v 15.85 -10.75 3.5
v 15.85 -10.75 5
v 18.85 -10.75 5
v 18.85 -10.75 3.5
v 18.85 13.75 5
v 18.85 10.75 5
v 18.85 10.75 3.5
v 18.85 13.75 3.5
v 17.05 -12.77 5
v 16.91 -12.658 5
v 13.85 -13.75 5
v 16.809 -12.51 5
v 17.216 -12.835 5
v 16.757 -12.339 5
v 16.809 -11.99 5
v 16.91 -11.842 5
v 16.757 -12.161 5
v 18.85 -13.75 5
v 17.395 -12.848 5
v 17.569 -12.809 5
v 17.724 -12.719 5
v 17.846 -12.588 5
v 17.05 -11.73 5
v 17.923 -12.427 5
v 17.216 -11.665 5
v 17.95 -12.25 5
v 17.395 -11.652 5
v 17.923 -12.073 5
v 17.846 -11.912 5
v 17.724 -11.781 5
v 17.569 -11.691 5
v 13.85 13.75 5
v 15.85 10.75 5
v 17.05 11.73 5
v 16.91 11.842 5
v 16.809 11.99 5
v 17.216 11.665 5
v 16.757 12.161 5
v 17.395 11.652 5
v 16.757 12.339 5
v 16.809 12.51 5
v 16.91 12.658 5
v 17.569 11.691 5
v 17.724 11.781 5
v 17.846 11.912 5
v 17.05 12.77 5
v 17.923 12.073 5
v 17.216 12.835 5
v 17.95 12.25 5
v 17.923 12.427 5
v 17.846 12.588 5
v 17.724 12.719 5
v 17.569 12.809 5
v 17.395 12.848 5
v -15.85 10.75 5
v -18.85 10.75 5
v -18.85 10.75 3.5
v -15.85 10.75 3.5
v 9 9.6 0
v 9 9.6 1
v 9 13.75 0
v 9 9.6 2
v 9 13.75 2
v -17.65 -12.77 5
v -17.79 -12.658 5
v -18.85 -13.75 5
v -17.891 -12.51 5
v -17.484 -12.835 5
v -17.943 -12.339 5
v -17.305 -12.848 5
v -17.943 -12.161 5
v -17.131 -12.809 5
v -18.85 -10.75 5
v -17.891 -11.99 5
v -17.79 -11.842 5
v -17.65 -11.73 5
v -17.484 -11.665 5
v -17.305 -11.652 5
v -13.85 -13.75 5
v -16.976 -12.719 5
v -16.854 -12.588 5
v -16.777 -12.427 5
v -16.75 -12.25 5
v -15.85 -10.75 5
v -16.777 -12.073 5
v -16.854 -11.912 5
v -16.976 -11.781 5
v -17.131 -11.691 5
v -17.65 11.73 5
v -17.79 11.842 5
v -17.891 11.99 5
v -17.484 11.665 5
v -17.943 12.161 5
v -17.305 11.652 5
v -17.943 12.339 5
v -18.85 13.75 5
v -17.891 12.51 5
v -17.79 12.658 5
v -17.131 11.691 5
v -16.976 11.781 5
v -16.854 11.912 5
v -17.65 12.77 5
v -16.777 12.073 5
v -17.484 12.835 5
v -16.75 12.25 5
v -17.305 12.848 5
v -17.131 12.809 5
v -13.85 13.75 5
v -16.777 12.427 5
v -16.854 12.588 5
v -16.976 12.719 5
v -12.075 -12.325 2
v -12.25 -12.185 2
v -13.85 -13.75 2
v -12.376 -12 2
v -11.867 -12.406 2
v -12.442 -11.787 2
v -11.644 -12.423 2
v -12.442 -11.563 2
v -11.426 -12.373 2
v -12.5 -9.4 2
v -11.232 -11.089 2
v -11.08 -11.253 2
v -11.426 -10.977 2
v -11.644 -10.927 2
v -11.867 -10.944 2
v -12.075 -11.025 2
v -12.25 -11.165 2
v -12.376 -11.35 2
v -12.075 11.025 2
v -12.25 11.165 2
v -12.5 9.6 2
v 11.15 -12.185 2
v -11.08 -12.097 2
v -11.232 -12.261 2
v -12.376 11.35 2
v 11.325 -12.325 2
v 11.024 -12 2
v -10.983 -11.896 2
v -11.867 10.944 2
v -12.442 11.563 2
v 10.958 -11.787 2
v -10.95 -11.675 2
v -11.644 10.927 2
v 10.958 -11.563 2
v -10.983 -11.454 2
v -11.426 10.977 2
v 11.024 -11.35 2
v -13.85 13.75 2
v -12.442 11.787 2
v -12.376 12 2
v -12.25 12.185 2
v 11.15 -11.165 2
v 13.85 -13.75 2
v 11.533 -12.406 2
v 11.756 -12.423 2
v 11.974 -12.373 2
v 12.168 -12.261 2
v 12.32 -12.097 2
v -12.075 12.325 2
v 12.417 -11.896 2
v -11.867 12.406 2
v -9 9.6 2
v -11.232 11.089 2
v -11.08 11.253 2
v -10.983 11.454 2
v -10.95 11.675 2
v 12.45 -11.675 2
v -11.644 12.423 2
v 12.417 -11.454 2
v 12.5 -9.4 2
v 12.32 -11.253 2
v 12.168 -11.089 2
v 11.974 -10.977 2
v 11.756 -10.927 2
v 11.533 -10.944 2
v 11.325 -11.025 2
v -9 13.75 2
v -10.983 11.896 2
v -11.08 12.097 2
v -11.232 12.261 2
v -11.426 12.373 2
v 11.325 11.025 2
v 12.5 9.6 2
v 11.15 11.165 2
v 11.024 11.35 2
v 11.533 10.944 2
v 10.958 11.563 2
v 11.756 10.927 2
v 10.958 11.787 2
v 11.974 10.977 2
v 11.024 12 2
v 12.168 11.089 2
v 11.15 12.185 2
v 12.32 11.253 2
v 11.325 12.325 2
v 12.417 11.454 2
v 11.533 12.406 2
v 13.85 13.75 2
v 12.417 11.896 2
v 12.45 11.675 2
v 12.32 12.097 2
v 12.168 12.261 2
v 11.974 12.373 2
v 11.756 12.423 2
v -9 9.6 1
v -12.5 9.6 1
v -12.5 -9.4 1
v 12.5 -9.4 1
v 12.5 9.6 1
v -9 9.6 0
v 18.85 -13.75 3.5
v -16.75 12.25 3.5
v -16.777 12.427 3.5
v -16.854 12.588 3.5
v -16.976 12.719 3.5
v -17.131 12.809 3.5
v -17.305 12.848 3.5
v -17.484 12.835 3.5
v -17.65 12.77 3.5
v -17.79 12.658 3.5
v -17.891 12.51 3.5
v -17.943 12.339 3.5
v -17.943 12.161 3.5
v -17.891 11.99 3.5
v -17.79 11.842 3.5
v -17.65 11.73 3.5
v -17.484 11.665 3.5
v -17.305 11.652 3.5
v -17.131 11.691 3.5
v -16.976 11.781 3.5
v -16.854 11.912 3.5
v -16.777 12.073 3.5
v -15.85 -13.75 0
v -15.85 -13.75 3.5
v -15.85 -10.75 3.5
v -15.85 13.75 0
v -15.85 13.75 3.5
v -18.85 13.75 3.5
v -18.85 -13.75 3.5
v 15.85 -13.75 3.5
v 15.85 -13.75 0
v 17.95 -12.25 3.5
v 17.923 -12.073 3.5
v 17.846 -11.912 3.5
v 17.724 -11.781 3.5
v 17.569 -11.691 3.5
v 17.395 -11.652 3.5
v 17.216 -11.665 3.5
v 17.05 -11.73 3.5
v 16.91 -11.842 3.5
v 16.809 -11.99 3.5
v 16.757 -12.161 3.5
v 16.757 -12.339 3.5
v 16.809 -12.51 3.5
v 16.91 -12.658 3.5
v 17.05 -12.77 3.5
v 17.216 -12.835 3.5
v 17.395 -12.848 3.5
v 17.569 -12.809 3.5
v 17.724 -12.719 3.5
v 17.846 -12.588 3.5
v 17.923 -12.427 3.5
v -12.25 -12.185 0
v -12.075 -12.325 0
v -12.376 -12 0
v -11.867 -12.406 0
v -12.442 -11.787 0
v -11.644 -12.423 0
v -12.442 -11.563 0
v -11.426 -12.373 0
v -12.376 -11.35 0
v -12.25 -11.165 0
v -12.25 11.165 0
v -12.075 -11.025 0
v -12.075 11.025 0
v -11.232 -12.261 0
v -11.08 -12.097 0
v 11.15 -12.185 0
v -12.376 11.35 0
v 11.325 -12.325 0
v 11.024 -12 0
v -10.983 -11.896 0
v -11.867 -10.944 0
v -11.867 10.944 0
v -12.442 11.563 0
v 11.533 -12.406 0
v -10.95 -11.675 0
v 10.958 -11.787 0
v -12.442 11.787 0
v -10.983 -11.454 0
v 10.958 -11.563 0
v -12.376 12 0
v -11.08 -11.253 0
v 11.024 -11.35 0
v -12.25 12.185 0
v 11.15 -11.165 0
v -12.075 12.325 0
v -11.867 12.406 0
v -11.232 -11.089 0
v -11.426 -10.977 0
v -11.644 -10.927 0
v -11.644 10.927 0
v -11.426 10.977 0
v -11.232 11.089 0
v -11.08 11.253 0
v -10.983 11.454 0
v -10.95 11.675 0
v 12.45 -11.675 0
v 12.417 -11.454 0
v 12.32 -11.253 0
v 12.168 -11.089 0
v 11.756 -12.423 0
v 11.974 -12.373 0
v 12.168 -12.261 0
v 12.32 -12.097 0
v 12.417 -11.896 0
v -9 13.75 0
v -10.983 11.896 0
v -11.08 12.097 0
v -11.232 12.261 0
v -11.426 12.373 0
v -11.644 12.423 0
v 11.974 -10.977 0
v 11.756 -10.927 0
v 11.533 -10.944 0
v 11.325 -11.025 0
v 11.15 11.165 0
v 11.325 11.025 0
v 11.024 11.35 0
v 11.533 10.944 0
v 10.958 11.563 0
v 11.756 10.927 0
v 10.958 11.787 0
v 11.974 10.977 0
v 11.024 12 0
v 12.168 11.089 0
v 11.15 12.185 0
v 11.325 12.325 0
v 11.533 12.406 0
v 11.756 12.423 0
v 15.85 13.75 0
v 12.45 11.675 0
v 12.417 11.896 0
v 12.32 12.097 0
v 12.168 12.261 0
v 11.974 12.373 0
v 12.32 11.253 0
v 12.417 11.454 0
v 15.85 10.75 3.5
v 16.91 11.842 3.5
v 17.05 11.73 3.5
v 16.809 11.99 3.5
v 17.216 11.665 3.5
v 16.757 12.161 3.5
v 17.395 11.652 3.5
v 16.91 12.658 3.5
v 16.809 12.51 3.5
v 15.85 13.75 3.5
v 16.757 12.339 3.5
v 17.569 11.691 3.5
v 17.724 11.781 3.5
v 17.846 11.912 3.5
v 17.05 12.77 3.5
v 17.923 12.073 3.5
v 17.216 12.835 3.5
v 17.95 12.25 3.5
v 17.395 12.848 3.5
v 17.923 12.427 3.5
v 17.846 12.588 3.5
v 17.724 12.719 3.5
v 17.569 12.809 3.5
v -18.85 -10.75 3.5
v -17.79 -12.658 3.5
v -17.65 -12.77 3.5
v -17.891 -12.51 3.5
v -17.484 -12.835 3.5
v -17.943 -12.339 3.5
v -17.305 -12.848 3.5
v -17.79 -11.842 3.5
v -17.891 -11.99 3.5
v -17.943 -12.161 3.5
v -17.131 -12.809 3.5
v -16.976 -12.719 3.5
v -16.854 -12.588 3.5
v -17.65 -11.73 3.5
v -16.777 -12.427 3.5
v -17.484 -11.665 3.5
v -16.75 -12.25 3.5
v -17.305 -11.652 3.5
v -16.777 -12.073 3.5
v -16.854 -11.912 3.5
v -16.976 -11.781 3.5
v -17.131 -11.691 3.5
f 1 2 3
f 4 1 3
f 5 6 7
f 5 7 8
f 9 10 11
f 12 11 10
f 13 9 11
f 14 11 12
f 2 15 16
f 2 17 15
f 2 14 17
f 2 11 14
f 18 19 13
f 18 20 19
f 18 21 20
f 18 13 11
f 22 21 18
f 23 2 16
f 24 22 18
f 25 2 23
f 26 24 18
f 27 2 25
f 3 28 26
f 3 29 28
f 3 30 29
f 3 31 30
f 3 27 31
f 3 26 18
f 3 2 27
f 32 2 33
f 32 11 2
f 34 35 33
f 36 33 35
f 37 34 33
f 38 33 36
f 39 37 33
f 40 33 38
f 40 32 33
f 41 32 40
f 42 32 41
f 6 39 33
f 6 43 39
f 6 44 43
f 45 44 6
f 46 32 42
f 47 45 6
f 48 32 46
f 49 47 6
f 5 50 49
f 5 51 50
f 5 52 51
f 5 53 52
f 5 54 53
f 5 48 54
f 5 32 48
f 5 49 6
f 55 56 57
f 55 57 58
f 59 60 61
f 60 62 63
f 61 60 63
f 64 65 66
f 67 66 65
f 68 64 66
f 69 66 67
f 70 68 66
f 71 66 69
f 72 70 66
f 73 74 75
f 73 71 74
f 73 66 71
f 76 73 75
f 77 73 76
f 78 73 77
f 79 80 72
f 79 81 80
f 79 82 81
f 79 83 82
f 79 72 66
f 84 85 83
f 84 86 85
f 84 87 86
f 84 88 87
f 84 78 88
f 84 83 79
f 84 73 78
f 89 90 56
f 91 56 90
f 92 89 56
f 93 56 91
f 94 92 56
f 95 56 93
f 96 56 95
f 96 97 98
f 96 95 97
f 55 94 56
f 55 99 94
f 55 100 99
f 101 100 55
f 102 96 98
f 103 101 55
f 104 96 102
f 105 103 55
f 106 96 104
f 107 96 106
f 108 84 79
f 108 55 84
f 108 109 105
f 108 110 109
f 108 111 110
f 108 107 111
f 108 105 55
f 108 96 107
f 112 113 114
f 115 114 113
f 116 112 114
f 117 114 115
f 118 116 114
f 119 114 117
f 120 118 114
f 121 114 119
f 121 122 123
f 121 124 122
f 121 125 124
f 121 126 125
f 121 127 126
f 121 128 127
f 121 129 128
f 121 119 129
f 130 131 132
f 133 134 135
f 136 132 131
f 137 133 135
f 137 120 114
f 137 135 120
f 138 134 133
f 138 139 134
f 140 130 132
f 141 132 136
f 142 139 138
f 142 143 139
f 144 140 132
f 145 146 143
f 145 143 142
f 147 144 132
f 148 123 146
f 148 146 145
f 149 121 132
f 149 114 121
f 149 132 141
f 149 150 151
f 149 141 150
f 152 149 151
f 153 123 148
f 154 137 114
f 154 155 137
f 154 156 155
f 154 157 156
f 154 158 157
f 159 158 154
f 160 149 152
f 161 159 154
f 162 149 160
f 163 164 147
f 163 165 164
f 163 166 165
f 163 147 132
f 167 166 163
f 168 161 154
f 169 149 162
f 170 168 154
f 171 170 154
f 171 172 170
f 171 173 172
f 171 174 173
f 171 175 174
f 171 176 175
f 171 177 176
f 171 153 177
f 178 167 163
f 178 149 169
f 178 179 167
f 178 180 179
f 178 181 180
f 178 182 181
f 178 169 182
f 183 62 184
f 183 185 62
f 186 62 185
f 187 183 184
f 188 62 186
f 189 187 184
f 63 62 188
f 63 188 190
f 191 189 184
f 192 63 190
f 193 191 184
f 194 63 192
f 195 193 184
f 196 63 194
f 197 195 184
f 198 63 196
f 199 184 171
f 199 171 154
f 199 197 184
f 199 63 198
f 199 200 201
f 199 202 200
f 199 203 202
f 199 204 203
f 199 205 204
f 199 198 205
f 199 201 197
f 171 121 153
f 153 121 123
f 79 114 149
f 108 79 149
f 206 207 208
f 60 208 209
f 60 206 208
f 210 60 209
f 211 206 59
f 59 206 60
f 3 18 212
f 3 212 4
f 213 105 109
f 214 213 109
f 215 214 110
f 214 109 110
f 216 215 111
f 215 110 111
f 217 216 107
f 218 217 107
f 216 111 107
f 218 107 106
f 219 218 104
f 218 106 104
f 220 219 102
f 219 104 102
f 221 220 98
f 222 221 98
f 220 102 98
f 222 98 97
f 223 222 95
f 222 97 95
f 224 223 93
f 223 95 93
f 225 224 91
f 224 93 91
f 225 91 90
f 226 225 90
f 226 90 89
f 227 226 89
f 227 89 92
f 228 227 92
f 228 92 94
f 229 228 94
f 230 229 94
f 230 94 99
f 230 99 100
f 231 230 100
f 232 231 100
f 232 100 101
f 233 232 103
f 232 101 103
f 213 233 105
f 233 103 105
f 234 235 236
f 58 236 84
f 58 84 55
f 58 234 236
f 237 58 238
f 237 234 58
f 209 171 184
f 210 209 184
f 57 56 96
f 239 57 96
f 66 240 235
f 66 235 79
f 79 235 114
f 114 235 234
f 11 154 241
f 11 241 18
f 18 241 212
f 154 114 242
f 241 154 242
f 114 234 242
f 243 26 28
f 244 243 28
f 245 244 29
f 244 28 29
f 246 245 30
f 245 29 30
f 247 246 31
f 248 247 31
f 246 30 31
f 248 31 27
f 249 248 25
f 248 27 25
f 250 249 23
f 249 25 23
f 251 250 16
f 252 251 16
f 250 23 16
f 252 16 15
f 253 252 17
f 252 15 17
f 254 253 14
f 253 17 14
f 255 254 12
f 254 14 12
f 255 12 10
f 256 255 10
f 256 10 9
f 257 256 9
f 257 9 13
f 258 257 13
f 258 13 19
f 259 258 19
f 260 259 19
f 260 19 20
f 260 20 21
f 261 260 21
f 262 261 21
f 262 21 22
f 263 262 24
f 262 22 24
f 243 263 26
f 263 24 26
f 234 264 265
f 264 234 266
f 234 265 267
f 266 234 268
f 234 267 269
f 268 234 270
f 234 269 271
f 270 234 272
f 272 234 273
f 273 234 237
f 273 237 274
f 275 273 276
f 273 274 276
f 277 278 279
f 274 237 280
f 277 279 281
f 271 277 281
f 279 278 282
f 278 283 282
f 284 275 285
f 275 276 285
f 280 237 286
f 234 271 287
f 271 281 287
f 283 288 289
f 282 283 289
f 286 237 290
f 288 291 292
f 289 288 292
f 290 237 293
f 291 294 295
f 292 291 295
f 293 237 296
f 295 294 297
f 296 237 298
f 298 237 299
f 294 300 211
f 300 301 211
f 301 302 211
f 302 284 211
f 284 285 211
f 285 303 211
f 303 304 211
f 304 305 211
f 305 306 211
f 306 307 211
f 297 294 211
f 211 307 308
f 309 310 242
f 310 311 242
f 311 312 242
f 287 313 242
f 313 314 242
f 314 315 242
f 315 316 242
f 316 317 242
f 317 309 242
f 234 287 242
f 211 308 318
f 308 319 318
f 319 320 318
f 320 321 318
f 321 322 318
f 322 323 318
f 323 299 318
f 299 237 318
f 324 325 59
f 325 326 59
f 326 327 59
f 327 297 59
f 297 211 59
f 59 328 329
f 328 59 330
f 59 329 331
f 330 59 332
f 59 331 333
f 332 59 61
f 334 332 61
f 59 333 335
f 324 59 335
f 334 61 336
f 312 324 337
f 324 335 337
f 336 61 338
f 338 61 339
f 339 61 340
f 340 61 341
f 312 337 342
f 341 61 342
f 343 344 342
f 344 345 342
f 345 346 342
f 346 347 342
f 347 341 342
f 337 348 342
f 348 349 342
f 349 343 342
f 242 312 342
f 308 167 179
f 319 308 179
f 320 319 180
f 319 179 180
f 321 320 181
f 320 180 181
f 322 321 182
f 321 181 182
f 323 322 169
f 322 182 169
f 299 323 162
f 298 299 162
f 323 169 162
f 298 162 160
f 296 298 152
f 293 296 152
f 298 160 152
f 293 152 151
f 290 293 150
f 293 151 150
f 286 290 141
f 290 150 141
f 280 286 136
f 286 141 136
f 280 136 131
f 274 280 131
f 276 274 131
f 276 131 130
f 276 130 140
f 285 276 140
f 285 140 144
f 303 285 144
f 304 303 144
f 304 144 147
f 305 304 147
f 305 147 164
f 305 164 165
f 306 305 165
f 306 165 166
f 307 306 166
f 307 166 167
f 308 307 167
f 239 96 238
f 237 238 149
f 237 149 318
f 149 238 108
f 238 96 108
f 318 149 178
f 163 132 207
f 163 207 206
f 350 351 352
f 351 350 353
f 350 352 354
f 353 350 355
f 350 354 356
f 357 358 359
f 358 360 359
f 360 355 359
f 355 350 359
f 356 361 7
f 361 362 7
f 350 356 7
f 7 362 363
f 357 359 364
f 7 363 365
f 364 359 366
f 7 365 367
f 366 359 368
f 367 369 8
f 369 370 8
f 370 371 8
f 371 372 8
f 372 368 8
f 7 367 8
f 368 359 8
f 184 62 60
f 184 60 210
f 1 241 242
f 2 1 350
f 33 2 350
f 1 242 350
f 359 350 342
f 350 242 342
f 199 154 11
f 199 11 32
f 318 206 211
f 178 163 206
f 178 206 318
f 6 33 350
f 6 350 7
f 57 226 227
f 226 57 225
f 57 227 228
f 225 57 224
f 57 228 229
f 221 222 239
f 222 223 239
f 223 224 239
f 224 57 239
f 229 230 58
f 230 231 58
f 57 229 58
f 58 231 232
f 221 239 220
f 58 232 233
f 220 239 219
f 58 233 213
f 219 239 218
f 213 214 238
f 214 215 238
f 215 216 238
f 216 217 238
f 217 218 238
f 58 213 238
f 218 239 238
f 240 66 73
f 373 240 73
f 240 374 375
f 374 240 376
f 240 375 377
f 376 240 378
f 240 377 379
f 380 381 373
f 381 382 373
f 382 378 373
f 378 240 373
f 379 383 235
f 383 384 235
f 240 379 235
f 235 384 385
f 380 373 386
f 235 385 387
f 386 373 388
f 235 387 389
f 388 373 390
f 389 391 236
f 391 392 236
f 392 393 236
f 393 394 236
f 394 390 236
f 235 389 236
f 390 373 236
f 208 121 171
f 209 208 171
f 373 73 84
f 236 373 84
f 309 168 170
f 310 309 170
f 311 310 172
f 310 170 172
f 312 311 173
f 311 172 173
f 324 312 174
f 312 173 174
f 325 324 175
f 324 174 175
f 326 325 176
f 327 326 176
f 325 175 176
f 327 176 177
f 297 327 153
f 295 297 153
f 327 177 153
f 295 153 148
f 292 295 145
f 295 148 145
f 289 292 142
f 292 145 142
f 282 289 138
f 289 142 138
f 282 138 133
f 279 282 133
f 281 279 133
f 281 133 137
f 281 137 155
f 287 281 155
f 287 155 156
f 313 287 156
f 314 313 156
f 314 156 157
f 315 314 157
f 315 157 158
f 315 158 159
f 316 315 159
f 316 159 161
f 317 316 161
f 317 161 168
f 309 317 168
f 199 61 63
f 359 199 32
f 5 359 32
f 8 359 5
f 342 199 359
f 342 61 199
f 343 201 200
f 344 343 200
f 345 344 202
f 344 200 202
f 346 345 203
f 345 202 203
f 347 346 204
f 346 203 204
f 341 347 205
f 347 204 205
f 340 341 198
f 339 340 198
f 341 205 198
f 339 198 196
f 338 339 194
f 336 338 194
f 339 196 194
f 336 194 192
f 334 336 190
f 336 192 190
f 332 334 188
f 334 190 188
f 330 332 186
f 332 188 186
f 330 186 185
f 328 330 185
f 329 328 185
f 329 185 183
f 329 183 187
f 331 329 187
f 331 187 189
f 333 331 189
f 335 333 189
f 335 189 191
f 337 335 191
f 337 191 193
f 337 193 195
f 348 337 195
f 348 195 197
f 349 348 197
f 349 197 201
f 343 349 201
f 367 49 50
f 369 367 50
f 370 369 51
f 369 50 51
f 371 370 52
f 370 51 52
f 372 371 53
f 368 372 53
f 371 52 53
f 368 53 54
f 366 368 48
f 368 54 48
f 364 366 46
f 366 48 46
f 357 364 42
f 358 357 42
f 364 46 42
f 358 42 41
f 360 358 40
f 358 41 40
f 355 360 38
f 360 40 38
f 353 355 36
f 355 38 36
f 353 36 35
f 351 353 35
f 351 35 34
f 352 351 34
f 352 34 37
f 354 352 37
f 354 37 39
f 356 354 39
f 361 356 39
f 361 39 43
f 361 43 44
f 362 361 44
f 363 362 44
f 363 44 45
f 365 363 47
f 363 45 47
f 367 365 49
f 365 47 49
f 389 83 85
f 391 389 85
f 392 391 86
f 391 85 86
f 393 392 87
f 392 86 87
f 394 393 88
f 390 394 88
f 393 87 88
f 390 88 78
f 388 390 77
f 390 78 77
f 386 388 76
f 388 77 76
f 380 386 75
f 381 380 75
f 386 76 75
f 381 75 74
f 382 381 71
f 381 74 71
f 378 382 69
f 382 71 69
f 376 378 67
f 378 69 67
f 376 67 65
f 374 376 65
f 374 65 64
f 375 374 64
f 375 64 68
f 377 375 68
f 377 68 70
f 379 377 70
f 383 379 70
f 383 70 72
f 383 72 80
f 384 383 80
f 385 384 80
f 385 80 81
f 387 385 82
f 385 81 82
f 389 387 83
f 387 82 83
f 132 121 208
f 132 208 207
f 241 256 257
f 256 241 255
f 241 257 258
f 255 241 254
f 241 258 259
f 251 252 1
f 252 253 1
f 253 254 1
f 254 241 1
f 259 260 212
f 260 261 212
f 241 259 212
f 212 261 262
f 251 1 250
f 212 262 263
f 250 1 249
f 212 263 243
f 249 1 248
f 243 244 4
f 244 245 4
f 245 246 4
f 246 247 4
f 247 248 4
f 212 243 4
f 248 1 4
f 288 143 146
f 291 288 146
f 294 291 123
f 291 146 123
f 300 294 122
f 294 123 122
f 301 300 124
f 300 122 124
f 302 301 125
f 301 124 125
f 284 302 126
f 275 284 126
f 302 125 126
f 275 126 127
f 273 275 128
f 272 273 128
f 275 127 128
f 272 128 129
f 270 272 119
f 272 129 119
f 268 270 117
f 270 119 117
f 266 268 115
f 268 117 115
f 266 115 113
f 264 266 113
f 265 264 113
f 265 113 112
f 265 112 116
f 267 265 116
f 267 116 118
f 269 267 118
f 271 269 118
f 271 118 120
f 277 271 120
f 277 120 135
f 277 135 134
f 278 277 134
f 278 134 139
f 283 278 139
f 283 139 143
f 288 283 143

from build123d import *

# Parameters (mm, degrees)
SKETCH_1_W          = 27.7
SKETCH_1_H          = 27.5
EXTRUDE_1_DEPTH     = 2
SKETCH_1_13_W       = 2
SKETCH_1_13_H       = 27.5
EXTRUDE_2_DEPTH     = 5
SKETCH_2_R          = 0.75
SKETCH_2_W          = 18
SKETCH_2_H          = 4.15
CUT_EXTRUDE_1_DEPTH = 22.196344024
SKETCH_2_3_W        = 25
SKETCH_2_3_H        = 19
CUT_EXTRUDE_2_DEPTH = 1
EXTRUDE_START       = 5
SKETCH_1_14_W       = 3
SKETCH_1_14_H       = 3
SKETCH_1_14_R       = 0.6
EXTRUDE_3_DEPTH     = 1.5


with BuildPart() as part:
    # 草图1 → 凸台-拉伸1 (new body)
    with BuildSketch(Plane.XY):
        Rectangle(SKETCH_1_W, SKETCH_1_H)
    extrude(amount=EXTRUDE_1_DEPTH)

    # 草图1<13> → 凸台-拉伸2 (add)
    with BuildSketch(Plane.XY):
        with Locations((-14.85, 0)):
            Rectangle(SKETCH_1_13_W, SKETCH_1_13_H)
        with Locations((14.85, 0)):
            Rectangle(SKETCH_1_13_W, SKETCH_1_13_H)
    extrude(amount=EXTRUDE_2_DEPTH)

    # 草图2 → 切除-拉伸1 (cut, through all)
    with BuildSketch(Plane.XY.offset(2)):
        with Locations((-11.7, 11.675)):
            Circle(SKETCH_2_R)
        with Locations((11.7, 11.675)):
            Circle(SKETCH_2_R)
        with Locations((-11.7, -11.675)):
            Circle(SKETCH_2_R)
        with Locations((11.7, -11.675)):
            Circle(SKETCH_2_R)
        with Locations((0, 11.675)):
            Rectangle(SKETCH_2_W, SKETCH_2_H)
    extrude(amount=-CUT_EXTRUDE_1_DEPTH, mode=Mode.SUBTRACT)

    # 草图2<3> → 切除-拉伸2 (cut)
    with BuildSketch(Plane.XY.offset(2)):
        with Locations((0, 0.1)):
            Rectangle(SKETCH_2_3_W, SKETCH_2_3_H)
    extrude(amount=-CUT_EXTRUDE_2_DEPTH, mode=Mode.SUBTRACT)

    # 草图1<14> → 凸台-拉伸3 (add)
    # profile 1 of 4: a face of its own
    with BuildSketch(Plane.XY.offset(EXTRUDE_START)):
        with Locations((-17.35, 12.25)):
            Rectangle(SKETCH_1_14_W, SKETCH_1_14_H)
        with Locations((-17.35, 12.25)):
            Circle(SKETCH_1_14_R, mode=Mode.SUBTRACT)
    # profile 2 of 4: a face of its own
    with BuildSketch(Plane.XY.offset(EXTRUDE_START)):
        with Locations((-17.35, -12.25)):
            Rectangle(SKETCH_1_14_W, SKETCH_1_14_H)
        with Locations((-17.35, -12.25)):
            Circle(SKETCH_1_14_R, mode=Mode.SUBTRACT)
    # profile 3 of 4: a face of its own
    with BuildSketch(Plane.XY.offset(EXTRUDE_START)):
        with Locations((17.35, -12.25)):
            Rectangle(SKETCH_1_14_W, SKETCH_1_14_H)
        with Locations((17.35, -12.25)):
            Circle(SKETCH_1_14_R, mode=Mode.SUBTRACT)
    # profile 4 of 4: a face of its own
    with BuildSketch(Plane.XY.offset(EXTRUDE_START)):
        with Locations((17.35, 12.25)):
            Rectangle(SKETCH_1_14_W, SKETCH_1_14_H)
        with Locations((17.35, 12.25)):
            Circle(SKETCH_1_14_R, mode=Mode.SUBTRACT)
    extrude(amount=-EXTRUDE_3_DEPTH)


solid = part.part
